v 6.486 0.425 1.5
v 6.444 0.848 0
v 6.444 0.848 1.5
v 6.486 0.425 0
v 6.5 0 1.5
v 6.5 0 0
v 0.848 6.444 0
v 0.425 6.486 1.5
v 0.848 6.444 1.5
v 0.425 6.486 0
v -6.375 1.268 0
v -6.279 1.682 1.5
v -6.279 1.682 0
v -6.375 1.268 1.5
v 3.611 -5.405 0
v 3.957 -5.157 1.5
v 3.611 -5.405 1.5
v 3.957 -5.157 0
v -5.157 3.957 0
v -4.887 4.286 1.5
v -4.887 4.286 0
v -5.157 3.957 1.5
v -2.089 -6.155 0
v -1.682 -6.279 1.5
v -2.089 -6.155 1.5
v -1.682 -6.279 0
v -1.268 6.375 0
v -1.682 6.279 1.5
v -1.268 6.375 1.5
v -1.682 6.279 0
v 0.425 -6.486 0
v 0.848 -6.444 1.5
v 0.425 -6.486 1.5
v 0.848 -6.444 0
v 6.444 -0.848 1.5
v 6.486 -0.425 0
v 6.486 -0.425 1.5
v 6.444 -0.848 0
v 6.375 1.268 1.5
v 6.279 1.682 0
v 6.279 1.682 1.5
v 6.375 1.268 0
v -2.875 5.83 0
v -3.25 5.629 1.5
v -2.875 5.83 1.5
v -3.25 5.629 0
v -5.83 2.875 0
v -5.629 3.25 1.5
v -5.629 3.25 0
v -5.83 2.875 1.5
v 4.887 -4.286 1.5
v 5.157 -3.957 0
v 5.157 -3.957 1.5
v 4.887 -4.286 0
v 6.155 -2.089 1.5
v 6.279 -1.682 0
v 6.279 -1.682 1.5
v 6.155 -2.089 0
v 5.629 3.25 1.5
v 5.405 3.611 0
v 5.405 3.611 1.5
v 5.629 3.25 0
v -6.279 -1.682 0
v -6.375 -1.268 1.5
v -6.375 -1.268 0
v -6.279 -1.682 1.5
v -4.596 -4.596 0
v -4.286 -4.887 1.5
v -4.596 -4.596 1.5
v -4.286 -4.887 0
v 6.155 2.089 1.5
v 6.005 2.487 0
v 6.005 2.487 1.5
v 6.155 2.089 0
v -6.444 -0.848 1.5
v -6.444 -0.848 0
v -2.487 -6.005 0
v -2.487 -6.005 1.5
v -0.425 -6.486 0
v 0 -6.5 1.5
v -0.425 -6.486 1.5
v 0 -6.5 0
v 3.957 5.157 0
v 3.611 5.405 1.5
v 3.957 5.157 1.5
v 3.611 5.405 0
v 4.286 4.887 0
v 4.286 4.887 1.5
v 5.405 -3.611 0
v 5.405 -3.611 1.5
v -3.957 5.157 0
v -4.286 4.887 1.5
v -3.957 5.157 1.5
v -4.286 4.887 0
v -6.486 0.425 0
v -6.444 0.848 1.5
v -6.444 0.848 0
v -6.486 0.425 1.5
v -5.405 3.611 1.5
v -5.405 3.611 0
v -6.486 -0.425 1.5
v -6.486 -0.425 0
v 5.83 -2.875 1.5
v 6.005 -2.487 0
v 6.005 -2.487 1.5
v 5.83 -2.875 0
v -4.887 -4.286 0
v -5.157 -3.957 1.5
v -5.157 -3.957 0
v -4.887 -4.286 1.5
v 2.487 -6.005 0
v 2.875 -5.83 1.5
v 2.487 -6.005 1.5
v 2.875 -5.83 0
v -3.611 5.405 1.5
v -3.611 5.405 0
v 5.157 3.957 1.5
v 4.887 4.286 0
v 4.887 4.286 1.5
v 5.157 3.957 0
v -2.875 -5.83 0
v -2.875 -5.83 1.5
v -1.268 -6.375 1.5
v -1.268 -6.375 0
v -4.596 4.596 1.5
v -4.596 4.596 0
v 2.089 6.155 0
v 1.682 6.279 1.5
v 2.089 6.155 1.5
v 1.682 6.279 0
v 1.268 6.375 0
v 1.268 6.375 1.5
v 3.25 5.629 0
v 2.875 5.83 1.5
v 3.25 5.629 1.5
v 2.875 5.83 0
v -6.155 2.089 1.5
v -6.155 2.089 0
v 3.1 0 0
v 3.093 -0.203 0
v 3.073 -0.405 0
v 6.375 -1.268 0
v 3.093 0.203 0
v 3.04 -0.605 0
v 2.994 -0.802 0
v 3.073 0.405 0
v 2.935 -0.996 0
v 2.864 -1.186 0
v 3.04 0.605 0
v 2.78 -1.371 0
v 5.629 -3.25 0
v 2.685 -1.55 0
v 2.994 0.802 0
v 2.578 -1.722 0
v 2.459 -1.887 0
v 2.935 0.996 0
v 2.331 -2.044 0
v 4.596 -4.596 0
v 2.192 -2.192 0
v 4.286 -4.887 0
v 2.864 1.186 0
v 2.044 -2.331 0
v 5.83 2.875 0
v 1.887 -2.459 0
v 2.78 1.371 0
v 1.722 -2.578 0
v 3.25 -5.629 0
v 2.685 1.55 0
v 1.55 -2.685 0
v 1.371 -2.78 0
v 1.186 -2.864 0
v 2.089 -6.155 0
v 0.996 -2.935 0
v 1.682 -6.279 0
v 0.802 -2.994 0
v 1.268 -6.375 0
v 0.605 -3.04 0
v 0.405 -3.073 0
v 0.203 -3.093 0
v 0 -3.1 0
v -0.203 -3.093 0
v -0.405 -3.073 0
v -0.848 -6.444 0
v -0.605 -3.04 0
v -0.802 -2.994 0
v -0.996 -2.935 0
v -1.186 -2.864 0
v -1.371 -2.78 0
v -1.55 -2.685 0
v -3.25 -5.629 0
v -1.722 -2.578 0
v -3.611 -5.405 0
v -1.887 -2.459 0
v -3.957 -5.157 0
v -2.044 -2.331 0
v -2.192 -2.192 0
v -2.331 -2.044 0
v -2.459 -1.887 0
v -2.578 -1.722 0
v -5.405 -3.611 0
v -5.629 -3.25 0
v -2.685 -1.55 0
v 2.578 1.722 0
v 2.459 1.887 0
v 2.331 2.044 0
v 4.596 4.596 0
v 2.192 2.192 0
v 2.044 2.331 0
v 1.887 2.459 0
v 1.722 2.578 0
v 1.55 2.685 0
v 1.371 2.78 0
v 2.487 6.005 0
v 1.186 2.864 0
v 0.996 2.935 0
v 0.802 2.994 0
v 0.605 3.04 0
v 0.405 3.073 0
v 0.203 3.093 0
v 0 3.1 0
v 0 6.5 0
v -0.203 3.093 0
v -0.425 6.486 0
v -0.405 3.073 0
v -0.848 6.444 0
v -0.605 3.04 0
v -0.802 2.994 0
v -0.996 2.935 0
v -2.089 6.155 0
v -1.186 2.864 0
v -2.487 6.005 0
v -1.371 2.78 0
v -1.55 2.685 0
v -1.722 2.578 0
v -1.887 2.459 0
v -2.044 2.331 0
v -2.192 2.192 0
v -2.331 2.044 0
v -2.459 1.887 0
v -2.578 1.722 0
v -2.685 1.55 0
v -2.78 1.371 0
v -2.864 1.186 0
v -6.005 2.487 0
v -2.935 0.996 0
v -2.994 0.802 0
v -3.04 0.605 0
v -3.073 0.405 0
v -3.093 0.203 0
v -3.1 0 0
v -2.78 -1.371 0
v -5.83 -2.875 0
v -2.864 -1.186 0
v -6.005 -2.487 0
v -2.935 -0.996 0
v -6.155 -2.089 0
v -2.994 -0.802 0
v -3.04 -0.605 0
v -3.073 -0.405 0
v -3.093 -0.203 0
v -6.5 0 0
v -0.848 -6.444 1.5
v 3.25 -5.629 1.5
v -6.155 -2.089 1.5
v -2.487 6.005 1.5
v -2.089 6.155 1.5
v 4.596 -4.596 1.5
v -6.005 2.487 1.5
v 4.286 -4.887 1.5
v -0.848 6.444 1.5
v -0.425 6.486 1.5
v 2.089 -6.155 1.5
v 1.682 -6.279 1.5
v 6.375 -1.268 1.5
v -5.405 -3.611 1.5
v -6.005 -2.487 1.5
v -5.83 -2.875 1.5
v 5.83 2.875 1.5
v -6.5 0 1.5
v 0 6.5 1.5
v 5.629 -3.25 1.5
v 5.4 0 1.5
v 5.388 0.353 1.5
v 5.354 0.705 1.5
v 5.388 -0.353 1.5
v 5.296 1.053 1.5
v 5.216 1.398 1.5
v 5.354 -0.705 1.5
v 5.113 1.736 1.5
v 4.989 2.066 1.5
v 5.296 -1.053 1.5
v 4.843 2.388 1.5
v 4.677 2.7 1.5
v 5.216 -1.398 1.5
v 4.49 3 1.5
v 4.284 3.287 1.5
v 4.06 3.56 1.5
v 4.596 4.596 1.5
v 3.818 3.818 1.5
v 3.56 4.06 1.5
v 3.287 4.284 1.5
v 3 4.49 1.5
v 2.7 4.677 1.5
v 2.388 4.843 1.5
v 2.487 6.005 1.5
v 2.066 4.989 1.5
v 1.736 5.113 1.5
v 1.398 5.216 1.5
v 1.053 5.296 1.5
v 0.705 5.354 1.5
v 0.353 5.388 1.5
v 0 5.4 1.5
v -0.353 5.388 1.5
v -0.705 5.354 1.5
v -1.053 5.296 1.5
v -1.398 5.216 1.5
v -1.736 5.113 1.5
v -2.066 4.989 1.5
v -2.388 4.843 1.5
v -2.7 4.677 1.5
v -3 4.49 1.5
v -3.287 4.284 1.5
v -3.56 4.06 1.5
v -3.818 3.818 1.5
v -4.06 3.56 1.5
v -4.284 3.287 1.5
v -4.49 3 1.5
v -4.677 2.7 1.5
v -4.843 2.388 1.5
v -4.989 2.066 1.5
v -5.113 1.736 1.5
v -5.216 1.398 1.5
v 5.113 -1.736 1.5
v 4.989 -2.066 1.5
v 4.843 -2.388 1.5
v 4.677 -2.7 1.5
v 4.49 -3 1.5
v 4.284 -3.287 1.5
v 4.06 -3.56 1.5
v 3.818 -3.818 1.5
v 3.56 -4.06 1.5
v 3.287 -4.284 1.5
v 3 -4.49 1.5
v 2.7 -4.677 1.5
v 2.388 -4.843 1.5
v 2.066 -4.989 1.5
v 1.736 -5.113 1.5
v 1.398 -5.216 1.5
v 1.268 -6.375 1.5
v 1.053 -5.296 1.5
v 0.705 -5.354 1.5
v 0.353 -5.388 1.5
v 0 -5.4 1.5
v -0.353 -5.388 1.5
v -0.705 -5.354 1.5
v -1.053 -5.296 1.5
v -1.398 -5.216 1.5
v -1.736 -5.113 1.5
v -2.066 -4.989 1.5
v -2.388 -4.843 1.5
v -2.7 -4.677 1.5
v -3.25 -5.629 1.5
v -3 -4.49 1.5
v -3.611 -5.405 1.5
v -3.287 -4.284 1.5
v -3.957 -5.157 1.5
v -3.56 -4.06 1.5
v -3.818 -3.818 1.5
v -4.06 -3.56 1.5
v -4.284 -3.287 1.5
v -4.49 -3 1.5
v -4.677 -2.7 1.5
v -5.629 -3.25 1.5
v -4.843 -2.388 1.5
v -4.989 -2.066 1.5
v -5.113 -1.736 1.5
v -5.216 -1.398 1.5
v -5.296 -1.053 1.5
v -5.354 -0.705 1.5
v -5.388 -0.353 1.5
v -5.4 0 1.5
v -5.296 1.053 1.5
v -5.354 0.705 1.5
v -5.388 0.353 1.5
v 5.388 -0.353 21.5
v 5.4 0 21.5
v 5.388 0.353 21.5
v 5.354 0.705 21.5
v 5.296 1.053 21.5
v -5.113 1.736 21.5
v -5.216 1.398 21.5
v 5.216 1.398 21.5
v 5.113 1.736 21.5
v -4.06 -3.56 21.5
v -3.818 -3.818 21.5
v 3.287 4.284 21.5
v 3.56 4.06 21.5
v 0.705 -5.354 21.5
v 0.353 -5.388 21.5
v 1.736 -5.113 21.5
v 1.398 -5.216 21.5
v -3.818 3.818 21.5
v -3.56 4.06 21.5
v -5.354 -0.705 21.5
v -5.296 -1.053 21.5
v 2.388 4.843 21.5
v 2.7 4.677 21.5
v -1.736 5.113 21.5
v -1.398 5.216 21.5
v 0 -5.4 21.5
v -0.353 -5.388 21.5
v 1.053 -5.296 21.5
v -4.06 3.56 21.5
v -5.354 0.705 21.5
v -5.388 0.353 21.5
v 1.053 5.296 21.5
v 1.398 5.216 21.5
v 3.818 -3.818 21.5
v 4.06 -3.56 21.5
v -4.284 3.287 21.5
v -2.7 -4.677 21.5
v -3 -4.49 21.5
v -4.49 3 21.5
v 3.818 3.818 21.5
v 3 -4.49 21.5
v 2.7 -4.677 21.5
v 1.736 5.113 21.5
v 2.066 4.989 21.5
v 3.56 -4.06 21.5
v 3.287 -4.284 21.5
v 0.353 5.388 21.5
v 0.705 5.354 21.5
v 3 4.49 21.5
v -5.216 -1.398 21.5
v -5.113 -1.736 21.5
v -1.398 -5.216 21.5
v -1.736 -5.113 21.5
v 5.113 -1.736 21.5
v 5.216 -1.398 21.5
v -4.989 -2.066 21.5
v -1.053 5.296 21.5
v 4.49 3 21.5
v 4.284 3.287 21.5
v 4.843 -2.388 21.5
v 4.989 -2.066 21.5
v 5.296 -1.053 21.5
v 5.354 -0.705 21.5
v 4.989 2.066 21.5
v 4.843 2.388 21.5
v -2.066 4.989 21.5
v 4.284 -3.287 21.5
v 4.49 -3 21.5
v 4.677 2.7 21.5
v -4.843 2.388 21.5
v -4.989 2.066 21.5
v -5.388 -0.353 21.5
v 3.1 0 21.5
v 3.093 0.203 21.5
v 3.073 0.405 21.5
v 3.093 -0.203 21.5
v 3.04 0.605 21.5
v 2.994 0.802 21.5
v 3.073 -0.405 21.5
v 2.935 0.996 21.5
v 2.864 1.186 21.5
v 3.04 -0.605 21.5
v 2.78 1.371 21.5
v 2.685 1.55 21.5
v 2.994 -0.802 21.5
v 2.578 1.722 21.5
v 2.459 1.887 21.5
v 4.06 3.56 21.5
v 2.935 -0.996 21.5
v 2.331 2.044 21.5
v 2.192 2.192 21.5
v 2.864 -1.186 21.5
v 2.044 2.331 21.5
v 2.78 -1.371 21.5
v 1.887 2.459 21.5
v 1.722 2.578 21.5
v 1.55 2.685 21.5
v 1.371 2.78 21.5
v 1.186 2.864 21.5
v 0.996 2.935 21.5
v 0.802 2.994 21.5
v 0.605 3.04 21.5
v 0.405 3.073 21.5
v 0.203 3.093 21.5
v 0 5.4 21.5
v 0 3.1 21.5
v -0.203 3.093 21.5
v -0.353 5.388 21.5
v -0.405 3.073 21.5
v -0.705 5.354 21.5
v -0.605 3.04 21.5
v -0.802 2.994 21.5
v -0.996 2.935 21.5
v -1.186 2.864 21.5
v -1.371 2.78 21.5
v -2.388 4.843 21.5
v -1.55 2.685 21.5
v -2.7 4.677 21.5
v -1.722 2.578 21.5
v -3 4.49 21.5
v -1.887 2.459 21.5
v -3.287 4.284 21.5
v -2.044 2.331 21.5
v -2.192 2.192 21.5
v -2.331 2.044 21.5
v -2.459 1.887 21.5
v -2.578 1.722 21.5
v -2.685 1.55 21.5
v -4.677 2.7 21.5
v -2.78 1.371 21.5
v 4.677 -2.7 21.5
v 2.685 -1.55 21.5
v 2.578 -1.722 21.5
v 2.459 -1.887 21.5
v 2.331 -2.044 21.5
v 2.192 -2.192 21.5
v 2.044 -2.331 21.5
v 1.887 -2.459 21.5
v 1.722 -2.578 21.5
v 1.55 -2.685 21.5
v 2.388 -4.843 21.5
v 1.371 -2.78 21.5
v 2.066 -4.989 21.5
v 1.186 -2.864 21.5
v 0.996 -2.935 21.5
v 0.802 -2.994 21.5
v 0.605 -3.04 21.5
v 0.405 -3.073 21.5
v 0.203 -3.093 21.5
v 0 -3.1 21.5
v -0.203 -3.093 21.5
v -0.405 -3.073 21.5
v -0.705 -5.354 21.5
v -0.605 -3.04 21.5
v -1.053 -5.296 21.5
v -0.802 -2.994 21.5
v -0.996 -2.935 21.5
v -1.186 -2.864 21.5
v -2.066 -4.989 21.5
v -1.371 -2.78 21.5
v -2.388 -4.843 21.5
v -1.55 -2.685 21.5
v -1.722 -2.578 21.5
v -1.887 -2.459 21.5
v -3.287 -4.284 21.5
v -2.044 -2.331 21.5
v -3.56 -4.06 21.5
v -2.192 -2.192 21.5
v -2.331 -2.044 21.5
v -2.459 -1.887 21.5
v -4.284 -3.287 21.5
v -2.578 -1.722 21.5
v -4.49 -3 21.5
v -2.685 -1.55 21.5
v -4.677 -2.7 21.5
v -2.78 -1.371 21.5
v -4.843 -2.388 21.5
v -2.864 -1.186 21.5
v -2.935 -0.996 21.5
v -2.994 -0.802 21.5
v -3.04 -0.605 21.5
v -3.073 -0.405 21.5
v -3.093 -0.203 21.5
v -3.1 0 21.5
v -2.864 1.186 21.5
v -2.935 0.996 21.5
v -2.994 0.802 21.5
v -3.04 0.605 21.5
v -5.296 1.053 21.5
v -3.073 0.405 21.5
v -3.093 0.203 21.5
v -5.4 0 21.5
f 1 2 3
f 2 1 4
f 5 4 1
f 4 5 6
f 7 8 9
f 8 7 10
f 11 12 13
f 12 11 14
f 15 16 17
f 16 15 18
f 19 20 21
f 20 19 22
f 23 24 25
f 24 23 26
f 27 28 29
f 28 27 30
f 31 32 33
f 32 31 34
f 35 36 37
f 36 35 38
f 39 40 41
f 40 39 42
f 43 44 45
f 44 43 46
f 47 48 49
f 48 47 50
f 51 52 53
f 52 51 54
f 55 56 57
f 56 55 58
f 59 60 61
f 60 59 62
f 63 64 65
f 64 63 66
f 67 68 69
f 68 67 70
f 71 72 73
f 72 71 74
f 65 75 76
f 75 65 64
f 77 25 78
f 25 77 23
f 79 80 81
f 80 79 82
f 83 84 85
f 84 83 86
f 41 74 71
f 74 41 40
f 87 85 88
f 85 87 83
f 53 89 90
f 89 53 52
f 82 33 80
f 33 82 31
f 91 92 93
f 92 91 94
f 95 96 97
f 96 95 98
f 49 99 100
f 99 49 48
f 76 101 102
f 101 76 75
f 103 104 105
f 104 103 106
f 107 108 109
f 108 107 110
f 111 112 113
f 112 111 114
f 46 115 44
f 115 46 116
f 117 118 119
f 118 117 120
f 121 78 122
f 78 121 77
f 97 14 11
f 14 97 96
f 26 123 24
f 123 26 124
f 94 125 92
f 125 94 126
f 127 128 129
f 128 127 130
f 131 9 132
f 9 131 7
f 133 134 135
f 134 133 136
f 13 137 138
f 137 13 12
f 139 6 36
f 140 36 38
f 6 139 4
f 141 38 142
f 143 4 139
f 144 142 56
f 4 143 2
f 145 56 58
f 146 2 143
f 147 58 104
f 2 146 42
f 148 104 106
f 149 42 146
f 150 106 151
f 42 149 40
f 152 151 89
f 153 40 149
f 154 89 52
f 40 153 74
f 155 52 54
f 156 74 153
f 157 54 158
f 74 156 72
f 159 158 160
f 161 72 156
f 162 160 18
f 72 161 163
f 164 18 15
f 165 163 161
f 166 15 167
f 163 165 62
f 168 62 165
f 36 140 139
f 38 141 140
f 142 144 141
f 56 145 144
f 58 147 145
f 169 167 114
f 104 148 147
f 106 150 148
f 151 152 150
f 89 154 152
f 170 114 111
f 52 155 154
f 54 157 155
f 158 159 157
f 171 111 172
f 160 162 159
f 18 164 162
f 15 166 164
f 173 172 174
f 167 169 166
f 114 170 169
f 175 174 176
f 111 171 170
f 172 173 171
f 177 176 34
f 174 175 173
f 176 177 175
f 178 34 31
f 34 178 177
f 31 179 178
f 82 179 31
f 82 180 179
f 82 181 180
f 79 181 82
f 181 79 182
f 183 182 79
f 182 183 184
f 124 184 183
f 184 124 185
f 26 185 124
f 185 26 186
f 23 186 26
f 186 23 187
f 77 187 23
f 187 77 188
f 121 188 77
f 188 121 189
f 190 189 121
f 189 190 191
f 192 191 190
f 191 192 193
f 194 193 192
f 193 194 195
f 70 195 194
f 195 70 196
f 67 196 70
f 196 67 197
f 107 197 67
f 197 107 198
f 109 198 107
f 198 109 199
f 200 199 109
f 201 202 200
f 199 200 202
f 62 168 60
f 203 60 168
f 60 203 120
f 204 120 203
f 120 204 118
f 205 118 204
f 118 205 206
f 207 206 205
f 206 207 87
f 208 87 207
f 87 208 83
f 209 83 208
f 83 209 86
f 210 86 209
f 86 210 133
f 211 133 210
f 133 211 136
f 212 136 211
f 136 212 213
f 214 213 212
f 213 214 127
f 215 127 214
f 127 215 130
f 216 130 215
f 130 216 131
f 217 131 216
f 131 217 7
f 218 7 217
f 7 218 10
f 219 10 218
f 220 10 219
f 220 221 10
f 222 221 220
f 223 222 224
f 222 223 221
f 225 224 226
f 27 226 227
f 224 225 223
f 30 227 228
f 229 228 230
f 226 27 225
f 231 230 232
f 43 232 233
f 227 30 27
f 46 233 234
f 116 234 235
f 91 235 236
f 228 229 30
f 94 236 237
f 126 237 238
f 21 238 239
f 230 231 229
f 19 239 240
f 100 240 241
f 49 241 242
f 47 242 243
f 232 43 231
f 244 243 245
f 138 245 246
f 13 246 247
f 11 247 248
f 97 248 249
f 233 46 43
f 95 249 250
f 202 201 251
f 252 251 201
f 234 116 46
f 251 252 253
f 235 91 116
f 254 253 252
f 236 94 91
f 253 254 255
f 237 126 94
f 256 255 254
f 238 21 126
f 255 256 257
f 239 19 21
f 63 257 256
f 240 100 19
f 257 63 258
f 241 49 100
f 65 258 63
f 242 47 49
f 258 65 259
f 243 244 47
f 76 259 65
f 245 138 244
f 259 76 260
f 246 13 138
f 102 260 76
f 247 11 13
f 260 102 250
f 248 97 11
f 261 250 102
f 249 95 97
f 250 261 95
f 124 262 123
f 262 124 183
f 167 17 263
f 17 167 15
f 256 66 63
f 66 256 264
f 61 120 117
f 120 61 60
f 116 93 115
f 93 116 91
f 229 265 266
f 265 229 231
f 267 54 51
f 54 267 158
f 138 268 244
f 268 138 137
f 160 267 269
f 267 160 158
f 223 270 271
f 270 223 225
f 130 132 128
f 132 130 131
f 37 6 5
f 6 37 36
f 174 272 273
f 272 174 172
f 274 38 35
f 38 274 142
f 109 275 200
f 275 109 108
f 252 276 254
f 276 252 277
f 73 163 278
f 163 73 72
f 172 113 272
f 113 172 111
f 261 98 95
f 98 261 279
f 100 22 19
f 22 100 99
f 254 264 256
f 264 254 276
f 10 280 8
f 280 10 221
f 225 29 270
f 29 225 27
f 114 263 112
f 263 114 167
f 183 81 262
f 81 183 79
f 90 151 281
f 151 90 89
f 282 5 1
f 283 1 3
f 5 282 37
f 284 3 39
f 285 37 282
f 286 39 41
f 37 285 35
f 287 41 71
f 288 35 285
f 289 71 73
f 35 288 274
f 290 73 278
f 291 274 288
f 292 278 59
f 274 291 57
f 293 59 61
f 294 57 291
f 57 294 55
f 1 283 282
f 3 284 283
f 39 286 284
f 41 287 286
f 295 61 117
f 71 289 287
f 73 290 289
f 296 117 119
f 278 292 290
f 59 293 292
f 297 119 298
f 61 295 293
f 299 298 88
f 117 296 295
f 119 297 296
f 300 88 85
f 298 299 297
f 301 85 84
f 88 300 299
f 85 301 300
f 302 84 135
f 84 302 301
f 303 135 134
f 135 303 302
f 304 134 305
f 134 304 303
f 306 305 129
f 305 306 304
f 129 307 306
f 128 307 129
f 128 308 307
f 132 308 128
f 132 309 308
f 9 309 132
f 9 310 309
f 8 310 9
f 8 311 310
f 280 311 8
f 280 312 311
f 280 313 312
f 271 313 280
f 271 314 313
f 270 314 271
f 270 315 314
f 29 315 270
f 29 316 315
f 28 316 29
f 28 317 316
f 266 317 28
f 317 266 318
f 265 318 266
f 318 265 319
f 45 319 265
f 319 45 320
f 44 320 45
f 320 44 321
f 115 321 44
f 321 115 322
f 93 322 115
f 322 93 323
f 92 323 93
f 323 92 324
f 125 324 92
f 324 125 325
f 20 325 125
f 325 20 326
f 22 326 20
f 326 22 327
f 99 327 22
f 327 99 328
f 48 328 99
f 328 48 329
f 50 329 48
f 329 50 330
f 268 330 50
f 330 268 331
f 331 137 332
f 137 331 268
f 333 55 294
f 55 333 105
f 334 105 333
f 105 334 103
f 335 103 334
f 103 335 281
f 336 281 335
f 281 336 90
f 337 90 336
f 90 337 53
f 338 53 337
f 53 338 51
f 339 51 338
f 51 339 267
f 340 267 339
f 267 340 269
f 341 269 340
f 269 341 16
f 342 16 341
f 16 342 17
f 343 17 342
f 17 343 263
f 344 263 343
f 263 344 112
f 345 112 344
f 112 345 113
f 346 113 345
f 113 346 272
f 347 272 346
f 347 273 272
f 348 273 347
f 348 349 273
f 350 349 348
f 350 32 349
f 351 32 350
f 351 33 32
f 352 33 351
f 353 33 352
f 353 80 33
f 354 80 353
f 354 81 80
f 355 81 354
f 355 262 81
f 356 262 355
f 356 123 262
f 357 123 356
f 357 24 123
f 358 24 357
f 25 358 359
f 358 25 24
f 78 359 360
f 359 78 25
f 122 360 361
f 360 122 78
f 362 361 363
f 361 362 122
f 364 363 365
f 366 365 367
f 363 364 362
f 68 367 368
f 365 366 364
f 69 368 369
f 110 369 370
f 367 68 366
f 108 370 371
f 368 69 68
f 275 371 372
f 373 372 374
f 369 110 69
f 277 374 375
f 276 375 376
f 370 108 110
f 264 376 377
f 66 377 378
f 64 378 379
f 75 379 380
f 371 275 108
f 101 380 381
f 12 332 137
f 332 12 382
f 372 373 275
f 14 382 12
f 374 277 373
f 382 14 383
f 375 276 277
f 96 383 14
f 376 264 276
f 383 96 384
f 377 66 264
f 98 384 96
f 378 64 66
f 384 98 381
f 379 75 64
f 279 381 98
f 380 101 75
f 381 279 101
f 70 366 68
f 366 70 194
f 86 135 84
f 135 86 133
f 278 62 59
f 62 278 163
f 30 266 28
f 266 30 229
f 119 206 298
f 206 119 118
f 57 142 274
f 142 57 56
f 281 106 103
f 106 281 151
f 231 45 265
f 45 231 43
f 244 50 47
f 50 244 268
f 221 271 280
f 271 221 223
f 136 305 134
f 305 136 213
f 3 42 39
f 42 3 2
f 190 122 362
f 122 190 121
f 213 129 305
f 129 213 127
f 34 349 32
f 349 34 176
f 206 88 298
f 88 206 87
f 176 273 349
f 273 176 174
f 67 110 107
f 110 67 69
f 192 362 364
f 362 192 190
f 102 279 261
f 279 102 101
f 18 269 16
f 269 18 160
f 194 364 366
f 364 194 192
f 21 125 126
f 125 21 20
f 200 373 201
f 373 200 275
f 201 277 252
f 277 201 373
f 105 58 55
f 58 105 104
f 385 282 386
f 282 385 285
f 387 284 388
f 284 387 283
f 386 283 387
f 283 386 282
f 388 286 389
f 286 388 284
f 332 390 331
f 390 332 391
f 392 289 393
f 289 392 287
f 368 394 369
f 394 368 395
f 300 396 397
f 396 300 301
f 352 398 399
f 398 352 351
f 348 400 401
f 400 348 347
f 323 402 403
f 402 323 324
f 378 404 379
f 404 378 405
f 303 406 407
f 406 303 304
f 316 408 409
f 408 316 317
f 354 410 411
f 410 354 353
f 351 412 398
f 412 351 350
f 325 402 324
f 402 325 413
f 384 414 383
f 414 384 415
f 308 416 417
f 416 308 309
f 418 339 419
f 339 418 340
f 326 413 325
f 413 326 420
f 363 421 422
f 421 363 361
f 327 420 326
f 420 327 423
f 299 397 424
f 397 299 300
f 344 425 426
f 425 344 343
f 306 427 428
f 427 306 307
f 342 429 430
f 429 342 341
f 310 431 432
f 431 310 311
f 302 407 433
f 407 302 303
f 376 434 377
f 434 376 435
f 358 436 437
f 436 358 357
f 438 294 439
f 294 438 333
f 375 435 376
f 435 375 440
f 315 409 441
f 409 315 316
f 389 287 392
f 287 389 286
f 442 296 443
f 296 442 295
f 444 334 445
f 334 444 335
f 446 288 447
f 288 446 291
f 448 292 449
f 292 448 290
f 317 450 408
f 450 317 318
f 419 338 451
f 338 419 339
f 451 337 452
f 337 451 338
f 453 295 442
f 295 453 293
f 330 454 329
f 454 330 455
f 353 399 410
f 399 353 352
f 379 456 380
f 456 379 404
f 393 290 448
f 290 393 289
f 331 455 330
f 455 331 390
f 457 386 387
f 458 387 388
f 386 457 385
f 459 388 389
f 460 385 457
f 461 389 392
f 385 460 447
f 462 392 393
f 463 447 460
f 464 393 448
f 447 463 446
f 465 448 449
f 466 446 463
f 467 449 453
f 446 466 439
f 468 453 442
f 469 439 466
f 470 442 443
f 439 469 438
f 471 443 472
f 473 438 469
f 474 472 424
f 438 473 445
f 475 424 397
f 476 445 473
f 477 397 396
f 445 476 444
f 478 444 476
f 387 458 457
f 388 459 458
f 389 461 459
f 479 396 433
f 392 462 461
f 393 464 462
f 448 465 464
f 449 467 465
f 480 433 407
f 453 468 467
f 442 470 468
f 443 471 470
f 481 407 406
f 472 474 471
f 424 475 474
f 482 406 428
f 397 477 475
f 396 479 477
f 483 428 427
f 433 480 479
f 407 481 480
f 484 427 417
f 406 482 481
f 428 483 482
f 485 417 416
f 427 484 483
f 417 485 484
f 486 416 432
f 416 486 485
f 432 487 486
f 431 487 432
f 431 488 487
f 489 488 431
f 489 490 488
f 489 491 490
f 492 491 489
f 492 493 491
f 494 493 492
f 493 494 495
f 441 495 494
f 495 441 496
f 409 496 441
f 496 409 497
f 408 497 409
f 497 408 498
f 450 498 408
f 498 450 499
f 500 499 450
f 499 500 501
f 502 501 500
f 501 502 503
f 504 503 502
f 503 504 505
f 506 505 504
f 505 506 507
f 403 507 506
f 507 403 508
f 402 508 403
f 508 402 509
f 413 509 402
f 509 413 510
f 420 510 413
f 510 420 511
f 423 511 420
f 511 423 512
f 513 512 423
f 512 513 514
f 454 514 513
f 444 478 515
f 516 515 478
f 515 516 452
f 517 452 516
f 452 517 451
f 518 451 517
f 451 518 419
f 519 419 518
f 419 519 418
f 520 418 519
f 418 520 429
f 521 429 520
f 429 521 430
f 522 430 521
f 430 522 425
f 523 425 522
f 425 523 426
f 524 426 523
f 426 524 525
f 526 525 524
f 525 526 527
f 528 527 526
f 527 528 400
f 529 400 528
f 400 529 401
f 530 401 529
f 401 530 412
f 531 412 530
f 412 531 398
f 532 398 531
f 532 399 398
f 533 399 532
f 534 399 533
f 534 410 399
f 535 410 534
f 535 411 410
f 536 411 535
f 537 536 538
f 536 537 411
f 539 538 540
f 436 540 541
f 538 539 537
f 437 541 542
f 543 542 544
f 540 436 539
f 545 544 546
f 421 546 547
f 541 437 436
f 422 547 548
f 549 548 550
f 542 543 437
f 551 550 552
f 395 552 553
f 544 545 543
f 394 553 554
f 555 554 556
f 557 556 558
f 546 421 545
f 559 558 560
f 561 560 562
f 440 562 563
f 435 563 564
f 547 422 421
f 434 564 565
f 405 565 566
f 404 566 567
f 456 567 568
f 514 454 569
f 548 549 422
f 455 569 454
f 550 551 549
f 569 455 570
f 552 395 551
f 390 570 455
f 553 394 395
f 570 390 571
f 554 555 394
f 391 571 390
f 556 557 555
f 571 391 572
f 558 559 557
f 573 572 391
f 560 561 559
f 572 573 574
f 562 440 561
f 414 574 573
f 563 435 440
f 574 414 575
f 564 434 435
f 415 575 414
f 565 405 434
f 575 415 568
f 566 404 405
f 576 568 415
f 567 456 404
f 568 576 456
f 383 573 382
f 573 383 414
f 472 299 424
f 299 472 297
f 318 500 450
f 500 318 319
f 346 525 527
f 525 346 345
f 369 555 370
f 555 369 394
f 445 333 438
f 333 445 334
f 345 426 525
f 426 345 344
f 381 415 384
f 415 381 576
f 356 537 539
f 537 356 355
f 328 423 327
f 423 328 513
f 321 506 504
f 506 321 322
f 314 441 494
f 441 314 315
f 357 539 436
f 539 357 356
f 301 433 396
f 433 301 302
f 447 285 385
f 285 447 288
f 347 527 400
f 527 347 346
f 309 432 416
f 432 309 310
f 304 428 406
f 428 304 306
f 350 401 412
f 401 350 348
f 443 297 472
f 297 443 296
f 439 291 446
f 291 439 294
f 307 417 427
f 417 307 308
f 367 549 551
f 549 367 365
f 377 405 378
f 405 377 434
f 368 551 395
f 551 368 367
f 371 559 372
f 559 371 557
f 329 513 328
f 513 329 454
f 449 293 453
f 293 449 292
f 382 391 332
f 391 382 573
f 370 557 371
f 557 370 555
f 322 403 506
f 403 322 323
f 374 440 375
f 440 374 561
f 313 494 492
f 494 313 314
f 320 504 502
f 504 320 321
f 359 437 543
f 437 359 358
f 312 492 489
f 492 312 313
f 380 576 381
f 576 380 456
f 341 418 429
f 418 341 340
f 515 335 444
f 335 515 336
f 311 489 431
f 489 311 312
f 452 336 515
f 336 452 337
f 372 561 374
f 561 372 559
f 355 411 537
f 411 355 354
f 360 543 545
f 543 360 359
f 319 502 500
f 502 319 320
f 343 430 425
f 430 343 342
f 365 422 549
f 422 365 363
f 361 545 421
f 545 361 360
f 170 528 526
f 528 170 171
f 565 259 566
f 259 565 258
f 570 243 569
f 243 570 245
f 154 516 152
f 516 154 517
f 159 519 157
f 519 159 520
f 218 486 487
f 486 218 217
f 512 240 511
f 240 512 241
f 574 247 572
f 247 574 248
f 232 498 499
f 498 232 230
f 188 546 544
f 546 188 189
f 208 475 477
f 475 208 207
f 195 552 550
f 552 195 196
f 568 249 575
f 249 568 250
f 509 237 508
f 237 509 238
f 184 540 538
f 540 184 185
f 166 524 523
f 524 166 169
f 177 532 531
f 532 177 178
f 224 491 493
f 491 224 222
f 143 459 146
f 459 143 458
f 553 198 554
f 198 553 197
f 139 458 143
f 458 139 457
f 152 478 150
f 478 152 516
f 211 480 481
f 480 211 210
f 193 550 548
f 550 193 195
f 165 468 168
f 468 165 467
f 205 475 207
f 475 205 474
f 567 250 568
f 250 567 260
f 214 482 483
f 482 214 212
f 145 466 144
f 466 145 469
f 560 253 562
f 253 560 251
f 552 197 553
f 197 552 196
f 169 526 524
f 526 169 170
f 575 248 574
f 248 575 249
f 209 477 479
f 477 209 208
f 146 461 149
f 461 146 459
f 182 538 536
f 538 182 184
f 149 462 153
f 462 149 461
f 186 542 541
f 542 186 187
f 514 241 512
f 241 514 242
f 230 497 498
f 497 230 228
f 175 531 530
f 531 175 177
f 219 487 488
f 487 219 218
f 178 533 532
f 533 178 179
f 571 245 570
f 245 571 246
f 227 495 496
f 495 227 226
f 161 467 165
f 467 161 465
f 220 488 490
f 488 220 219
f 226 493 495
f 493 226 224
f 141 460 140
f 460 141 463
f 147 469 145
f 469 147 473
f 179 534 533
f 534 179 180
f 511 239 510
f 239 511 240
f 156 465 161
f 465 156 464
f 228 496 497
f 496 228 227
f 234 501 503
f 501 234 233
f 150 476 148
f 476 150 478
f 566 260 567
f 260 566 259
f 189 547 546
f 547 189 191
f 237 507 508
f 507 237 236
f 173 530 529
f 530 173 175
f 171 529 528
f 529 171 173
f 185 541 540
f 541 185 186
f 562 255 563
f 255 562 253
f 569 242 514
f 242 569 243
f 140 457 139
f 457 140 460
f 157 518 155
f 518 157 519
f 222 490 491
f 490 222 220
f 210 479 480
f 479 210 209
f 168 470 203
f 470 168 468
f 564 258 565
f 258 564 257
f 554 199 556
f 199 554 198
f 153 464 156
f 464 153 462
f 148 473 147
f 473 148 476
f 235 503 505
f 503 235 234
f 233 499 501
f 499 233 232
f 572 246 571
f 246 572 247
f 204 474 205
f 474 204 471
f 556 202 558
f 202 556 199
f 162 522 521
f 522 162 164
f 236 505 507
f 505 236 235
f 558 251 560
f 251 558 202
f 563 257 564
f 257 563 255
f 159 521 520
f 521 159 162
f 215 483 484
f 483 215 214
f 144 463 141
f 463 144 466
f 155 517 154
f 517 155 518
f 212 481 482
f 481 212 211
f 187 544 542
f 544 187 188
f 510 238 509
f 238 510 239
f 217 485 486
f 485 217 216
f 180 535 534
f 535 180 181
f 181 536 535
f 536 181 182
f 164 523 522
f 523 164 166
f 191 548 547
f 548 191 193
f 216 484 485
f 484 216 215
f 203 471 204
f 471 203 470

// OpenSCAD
// Adapter sleeve: 0.2 mL PCR tube in a 1.5 mL rack hole
// Print orientation: collar on the bed (z = 0), sleeve body builds upward

// ---------- Dimensions (mm) ----------
collar_d      = 13;    // collar outer diameter
collar_h      = 1.5;   // collar thickness (z = 0 to 1.5)
sleeve_od     = 10.8;  // sleeve body outer diameter
sleeve_top_z  = 21.5;  // top of sleeve body (sleeve height)
bore_d        = 6.2;   // through-bore diameter
eps           = 0.5;   // cutter overshoot past faces

$fn = 96;              // curve resolution

// ---------- Model ----------
difference() {
    union() {
        // Collar
        cylinder(d = collar_d, h = collar_h);
        // Sleeve body (overlaps collar slightly for a clean union)
        translate([0, 0, collar_h - 0.01])
            cylinder(d = sleeve_od, h = sleeve_top_z - collar_h + 0.01);
    }
    // Full-height bore, open at both ends
    translate([0, 0, -eps])
        cylinder(d = bore_d, h = sleeve_top_z + 2 * eps);
}
